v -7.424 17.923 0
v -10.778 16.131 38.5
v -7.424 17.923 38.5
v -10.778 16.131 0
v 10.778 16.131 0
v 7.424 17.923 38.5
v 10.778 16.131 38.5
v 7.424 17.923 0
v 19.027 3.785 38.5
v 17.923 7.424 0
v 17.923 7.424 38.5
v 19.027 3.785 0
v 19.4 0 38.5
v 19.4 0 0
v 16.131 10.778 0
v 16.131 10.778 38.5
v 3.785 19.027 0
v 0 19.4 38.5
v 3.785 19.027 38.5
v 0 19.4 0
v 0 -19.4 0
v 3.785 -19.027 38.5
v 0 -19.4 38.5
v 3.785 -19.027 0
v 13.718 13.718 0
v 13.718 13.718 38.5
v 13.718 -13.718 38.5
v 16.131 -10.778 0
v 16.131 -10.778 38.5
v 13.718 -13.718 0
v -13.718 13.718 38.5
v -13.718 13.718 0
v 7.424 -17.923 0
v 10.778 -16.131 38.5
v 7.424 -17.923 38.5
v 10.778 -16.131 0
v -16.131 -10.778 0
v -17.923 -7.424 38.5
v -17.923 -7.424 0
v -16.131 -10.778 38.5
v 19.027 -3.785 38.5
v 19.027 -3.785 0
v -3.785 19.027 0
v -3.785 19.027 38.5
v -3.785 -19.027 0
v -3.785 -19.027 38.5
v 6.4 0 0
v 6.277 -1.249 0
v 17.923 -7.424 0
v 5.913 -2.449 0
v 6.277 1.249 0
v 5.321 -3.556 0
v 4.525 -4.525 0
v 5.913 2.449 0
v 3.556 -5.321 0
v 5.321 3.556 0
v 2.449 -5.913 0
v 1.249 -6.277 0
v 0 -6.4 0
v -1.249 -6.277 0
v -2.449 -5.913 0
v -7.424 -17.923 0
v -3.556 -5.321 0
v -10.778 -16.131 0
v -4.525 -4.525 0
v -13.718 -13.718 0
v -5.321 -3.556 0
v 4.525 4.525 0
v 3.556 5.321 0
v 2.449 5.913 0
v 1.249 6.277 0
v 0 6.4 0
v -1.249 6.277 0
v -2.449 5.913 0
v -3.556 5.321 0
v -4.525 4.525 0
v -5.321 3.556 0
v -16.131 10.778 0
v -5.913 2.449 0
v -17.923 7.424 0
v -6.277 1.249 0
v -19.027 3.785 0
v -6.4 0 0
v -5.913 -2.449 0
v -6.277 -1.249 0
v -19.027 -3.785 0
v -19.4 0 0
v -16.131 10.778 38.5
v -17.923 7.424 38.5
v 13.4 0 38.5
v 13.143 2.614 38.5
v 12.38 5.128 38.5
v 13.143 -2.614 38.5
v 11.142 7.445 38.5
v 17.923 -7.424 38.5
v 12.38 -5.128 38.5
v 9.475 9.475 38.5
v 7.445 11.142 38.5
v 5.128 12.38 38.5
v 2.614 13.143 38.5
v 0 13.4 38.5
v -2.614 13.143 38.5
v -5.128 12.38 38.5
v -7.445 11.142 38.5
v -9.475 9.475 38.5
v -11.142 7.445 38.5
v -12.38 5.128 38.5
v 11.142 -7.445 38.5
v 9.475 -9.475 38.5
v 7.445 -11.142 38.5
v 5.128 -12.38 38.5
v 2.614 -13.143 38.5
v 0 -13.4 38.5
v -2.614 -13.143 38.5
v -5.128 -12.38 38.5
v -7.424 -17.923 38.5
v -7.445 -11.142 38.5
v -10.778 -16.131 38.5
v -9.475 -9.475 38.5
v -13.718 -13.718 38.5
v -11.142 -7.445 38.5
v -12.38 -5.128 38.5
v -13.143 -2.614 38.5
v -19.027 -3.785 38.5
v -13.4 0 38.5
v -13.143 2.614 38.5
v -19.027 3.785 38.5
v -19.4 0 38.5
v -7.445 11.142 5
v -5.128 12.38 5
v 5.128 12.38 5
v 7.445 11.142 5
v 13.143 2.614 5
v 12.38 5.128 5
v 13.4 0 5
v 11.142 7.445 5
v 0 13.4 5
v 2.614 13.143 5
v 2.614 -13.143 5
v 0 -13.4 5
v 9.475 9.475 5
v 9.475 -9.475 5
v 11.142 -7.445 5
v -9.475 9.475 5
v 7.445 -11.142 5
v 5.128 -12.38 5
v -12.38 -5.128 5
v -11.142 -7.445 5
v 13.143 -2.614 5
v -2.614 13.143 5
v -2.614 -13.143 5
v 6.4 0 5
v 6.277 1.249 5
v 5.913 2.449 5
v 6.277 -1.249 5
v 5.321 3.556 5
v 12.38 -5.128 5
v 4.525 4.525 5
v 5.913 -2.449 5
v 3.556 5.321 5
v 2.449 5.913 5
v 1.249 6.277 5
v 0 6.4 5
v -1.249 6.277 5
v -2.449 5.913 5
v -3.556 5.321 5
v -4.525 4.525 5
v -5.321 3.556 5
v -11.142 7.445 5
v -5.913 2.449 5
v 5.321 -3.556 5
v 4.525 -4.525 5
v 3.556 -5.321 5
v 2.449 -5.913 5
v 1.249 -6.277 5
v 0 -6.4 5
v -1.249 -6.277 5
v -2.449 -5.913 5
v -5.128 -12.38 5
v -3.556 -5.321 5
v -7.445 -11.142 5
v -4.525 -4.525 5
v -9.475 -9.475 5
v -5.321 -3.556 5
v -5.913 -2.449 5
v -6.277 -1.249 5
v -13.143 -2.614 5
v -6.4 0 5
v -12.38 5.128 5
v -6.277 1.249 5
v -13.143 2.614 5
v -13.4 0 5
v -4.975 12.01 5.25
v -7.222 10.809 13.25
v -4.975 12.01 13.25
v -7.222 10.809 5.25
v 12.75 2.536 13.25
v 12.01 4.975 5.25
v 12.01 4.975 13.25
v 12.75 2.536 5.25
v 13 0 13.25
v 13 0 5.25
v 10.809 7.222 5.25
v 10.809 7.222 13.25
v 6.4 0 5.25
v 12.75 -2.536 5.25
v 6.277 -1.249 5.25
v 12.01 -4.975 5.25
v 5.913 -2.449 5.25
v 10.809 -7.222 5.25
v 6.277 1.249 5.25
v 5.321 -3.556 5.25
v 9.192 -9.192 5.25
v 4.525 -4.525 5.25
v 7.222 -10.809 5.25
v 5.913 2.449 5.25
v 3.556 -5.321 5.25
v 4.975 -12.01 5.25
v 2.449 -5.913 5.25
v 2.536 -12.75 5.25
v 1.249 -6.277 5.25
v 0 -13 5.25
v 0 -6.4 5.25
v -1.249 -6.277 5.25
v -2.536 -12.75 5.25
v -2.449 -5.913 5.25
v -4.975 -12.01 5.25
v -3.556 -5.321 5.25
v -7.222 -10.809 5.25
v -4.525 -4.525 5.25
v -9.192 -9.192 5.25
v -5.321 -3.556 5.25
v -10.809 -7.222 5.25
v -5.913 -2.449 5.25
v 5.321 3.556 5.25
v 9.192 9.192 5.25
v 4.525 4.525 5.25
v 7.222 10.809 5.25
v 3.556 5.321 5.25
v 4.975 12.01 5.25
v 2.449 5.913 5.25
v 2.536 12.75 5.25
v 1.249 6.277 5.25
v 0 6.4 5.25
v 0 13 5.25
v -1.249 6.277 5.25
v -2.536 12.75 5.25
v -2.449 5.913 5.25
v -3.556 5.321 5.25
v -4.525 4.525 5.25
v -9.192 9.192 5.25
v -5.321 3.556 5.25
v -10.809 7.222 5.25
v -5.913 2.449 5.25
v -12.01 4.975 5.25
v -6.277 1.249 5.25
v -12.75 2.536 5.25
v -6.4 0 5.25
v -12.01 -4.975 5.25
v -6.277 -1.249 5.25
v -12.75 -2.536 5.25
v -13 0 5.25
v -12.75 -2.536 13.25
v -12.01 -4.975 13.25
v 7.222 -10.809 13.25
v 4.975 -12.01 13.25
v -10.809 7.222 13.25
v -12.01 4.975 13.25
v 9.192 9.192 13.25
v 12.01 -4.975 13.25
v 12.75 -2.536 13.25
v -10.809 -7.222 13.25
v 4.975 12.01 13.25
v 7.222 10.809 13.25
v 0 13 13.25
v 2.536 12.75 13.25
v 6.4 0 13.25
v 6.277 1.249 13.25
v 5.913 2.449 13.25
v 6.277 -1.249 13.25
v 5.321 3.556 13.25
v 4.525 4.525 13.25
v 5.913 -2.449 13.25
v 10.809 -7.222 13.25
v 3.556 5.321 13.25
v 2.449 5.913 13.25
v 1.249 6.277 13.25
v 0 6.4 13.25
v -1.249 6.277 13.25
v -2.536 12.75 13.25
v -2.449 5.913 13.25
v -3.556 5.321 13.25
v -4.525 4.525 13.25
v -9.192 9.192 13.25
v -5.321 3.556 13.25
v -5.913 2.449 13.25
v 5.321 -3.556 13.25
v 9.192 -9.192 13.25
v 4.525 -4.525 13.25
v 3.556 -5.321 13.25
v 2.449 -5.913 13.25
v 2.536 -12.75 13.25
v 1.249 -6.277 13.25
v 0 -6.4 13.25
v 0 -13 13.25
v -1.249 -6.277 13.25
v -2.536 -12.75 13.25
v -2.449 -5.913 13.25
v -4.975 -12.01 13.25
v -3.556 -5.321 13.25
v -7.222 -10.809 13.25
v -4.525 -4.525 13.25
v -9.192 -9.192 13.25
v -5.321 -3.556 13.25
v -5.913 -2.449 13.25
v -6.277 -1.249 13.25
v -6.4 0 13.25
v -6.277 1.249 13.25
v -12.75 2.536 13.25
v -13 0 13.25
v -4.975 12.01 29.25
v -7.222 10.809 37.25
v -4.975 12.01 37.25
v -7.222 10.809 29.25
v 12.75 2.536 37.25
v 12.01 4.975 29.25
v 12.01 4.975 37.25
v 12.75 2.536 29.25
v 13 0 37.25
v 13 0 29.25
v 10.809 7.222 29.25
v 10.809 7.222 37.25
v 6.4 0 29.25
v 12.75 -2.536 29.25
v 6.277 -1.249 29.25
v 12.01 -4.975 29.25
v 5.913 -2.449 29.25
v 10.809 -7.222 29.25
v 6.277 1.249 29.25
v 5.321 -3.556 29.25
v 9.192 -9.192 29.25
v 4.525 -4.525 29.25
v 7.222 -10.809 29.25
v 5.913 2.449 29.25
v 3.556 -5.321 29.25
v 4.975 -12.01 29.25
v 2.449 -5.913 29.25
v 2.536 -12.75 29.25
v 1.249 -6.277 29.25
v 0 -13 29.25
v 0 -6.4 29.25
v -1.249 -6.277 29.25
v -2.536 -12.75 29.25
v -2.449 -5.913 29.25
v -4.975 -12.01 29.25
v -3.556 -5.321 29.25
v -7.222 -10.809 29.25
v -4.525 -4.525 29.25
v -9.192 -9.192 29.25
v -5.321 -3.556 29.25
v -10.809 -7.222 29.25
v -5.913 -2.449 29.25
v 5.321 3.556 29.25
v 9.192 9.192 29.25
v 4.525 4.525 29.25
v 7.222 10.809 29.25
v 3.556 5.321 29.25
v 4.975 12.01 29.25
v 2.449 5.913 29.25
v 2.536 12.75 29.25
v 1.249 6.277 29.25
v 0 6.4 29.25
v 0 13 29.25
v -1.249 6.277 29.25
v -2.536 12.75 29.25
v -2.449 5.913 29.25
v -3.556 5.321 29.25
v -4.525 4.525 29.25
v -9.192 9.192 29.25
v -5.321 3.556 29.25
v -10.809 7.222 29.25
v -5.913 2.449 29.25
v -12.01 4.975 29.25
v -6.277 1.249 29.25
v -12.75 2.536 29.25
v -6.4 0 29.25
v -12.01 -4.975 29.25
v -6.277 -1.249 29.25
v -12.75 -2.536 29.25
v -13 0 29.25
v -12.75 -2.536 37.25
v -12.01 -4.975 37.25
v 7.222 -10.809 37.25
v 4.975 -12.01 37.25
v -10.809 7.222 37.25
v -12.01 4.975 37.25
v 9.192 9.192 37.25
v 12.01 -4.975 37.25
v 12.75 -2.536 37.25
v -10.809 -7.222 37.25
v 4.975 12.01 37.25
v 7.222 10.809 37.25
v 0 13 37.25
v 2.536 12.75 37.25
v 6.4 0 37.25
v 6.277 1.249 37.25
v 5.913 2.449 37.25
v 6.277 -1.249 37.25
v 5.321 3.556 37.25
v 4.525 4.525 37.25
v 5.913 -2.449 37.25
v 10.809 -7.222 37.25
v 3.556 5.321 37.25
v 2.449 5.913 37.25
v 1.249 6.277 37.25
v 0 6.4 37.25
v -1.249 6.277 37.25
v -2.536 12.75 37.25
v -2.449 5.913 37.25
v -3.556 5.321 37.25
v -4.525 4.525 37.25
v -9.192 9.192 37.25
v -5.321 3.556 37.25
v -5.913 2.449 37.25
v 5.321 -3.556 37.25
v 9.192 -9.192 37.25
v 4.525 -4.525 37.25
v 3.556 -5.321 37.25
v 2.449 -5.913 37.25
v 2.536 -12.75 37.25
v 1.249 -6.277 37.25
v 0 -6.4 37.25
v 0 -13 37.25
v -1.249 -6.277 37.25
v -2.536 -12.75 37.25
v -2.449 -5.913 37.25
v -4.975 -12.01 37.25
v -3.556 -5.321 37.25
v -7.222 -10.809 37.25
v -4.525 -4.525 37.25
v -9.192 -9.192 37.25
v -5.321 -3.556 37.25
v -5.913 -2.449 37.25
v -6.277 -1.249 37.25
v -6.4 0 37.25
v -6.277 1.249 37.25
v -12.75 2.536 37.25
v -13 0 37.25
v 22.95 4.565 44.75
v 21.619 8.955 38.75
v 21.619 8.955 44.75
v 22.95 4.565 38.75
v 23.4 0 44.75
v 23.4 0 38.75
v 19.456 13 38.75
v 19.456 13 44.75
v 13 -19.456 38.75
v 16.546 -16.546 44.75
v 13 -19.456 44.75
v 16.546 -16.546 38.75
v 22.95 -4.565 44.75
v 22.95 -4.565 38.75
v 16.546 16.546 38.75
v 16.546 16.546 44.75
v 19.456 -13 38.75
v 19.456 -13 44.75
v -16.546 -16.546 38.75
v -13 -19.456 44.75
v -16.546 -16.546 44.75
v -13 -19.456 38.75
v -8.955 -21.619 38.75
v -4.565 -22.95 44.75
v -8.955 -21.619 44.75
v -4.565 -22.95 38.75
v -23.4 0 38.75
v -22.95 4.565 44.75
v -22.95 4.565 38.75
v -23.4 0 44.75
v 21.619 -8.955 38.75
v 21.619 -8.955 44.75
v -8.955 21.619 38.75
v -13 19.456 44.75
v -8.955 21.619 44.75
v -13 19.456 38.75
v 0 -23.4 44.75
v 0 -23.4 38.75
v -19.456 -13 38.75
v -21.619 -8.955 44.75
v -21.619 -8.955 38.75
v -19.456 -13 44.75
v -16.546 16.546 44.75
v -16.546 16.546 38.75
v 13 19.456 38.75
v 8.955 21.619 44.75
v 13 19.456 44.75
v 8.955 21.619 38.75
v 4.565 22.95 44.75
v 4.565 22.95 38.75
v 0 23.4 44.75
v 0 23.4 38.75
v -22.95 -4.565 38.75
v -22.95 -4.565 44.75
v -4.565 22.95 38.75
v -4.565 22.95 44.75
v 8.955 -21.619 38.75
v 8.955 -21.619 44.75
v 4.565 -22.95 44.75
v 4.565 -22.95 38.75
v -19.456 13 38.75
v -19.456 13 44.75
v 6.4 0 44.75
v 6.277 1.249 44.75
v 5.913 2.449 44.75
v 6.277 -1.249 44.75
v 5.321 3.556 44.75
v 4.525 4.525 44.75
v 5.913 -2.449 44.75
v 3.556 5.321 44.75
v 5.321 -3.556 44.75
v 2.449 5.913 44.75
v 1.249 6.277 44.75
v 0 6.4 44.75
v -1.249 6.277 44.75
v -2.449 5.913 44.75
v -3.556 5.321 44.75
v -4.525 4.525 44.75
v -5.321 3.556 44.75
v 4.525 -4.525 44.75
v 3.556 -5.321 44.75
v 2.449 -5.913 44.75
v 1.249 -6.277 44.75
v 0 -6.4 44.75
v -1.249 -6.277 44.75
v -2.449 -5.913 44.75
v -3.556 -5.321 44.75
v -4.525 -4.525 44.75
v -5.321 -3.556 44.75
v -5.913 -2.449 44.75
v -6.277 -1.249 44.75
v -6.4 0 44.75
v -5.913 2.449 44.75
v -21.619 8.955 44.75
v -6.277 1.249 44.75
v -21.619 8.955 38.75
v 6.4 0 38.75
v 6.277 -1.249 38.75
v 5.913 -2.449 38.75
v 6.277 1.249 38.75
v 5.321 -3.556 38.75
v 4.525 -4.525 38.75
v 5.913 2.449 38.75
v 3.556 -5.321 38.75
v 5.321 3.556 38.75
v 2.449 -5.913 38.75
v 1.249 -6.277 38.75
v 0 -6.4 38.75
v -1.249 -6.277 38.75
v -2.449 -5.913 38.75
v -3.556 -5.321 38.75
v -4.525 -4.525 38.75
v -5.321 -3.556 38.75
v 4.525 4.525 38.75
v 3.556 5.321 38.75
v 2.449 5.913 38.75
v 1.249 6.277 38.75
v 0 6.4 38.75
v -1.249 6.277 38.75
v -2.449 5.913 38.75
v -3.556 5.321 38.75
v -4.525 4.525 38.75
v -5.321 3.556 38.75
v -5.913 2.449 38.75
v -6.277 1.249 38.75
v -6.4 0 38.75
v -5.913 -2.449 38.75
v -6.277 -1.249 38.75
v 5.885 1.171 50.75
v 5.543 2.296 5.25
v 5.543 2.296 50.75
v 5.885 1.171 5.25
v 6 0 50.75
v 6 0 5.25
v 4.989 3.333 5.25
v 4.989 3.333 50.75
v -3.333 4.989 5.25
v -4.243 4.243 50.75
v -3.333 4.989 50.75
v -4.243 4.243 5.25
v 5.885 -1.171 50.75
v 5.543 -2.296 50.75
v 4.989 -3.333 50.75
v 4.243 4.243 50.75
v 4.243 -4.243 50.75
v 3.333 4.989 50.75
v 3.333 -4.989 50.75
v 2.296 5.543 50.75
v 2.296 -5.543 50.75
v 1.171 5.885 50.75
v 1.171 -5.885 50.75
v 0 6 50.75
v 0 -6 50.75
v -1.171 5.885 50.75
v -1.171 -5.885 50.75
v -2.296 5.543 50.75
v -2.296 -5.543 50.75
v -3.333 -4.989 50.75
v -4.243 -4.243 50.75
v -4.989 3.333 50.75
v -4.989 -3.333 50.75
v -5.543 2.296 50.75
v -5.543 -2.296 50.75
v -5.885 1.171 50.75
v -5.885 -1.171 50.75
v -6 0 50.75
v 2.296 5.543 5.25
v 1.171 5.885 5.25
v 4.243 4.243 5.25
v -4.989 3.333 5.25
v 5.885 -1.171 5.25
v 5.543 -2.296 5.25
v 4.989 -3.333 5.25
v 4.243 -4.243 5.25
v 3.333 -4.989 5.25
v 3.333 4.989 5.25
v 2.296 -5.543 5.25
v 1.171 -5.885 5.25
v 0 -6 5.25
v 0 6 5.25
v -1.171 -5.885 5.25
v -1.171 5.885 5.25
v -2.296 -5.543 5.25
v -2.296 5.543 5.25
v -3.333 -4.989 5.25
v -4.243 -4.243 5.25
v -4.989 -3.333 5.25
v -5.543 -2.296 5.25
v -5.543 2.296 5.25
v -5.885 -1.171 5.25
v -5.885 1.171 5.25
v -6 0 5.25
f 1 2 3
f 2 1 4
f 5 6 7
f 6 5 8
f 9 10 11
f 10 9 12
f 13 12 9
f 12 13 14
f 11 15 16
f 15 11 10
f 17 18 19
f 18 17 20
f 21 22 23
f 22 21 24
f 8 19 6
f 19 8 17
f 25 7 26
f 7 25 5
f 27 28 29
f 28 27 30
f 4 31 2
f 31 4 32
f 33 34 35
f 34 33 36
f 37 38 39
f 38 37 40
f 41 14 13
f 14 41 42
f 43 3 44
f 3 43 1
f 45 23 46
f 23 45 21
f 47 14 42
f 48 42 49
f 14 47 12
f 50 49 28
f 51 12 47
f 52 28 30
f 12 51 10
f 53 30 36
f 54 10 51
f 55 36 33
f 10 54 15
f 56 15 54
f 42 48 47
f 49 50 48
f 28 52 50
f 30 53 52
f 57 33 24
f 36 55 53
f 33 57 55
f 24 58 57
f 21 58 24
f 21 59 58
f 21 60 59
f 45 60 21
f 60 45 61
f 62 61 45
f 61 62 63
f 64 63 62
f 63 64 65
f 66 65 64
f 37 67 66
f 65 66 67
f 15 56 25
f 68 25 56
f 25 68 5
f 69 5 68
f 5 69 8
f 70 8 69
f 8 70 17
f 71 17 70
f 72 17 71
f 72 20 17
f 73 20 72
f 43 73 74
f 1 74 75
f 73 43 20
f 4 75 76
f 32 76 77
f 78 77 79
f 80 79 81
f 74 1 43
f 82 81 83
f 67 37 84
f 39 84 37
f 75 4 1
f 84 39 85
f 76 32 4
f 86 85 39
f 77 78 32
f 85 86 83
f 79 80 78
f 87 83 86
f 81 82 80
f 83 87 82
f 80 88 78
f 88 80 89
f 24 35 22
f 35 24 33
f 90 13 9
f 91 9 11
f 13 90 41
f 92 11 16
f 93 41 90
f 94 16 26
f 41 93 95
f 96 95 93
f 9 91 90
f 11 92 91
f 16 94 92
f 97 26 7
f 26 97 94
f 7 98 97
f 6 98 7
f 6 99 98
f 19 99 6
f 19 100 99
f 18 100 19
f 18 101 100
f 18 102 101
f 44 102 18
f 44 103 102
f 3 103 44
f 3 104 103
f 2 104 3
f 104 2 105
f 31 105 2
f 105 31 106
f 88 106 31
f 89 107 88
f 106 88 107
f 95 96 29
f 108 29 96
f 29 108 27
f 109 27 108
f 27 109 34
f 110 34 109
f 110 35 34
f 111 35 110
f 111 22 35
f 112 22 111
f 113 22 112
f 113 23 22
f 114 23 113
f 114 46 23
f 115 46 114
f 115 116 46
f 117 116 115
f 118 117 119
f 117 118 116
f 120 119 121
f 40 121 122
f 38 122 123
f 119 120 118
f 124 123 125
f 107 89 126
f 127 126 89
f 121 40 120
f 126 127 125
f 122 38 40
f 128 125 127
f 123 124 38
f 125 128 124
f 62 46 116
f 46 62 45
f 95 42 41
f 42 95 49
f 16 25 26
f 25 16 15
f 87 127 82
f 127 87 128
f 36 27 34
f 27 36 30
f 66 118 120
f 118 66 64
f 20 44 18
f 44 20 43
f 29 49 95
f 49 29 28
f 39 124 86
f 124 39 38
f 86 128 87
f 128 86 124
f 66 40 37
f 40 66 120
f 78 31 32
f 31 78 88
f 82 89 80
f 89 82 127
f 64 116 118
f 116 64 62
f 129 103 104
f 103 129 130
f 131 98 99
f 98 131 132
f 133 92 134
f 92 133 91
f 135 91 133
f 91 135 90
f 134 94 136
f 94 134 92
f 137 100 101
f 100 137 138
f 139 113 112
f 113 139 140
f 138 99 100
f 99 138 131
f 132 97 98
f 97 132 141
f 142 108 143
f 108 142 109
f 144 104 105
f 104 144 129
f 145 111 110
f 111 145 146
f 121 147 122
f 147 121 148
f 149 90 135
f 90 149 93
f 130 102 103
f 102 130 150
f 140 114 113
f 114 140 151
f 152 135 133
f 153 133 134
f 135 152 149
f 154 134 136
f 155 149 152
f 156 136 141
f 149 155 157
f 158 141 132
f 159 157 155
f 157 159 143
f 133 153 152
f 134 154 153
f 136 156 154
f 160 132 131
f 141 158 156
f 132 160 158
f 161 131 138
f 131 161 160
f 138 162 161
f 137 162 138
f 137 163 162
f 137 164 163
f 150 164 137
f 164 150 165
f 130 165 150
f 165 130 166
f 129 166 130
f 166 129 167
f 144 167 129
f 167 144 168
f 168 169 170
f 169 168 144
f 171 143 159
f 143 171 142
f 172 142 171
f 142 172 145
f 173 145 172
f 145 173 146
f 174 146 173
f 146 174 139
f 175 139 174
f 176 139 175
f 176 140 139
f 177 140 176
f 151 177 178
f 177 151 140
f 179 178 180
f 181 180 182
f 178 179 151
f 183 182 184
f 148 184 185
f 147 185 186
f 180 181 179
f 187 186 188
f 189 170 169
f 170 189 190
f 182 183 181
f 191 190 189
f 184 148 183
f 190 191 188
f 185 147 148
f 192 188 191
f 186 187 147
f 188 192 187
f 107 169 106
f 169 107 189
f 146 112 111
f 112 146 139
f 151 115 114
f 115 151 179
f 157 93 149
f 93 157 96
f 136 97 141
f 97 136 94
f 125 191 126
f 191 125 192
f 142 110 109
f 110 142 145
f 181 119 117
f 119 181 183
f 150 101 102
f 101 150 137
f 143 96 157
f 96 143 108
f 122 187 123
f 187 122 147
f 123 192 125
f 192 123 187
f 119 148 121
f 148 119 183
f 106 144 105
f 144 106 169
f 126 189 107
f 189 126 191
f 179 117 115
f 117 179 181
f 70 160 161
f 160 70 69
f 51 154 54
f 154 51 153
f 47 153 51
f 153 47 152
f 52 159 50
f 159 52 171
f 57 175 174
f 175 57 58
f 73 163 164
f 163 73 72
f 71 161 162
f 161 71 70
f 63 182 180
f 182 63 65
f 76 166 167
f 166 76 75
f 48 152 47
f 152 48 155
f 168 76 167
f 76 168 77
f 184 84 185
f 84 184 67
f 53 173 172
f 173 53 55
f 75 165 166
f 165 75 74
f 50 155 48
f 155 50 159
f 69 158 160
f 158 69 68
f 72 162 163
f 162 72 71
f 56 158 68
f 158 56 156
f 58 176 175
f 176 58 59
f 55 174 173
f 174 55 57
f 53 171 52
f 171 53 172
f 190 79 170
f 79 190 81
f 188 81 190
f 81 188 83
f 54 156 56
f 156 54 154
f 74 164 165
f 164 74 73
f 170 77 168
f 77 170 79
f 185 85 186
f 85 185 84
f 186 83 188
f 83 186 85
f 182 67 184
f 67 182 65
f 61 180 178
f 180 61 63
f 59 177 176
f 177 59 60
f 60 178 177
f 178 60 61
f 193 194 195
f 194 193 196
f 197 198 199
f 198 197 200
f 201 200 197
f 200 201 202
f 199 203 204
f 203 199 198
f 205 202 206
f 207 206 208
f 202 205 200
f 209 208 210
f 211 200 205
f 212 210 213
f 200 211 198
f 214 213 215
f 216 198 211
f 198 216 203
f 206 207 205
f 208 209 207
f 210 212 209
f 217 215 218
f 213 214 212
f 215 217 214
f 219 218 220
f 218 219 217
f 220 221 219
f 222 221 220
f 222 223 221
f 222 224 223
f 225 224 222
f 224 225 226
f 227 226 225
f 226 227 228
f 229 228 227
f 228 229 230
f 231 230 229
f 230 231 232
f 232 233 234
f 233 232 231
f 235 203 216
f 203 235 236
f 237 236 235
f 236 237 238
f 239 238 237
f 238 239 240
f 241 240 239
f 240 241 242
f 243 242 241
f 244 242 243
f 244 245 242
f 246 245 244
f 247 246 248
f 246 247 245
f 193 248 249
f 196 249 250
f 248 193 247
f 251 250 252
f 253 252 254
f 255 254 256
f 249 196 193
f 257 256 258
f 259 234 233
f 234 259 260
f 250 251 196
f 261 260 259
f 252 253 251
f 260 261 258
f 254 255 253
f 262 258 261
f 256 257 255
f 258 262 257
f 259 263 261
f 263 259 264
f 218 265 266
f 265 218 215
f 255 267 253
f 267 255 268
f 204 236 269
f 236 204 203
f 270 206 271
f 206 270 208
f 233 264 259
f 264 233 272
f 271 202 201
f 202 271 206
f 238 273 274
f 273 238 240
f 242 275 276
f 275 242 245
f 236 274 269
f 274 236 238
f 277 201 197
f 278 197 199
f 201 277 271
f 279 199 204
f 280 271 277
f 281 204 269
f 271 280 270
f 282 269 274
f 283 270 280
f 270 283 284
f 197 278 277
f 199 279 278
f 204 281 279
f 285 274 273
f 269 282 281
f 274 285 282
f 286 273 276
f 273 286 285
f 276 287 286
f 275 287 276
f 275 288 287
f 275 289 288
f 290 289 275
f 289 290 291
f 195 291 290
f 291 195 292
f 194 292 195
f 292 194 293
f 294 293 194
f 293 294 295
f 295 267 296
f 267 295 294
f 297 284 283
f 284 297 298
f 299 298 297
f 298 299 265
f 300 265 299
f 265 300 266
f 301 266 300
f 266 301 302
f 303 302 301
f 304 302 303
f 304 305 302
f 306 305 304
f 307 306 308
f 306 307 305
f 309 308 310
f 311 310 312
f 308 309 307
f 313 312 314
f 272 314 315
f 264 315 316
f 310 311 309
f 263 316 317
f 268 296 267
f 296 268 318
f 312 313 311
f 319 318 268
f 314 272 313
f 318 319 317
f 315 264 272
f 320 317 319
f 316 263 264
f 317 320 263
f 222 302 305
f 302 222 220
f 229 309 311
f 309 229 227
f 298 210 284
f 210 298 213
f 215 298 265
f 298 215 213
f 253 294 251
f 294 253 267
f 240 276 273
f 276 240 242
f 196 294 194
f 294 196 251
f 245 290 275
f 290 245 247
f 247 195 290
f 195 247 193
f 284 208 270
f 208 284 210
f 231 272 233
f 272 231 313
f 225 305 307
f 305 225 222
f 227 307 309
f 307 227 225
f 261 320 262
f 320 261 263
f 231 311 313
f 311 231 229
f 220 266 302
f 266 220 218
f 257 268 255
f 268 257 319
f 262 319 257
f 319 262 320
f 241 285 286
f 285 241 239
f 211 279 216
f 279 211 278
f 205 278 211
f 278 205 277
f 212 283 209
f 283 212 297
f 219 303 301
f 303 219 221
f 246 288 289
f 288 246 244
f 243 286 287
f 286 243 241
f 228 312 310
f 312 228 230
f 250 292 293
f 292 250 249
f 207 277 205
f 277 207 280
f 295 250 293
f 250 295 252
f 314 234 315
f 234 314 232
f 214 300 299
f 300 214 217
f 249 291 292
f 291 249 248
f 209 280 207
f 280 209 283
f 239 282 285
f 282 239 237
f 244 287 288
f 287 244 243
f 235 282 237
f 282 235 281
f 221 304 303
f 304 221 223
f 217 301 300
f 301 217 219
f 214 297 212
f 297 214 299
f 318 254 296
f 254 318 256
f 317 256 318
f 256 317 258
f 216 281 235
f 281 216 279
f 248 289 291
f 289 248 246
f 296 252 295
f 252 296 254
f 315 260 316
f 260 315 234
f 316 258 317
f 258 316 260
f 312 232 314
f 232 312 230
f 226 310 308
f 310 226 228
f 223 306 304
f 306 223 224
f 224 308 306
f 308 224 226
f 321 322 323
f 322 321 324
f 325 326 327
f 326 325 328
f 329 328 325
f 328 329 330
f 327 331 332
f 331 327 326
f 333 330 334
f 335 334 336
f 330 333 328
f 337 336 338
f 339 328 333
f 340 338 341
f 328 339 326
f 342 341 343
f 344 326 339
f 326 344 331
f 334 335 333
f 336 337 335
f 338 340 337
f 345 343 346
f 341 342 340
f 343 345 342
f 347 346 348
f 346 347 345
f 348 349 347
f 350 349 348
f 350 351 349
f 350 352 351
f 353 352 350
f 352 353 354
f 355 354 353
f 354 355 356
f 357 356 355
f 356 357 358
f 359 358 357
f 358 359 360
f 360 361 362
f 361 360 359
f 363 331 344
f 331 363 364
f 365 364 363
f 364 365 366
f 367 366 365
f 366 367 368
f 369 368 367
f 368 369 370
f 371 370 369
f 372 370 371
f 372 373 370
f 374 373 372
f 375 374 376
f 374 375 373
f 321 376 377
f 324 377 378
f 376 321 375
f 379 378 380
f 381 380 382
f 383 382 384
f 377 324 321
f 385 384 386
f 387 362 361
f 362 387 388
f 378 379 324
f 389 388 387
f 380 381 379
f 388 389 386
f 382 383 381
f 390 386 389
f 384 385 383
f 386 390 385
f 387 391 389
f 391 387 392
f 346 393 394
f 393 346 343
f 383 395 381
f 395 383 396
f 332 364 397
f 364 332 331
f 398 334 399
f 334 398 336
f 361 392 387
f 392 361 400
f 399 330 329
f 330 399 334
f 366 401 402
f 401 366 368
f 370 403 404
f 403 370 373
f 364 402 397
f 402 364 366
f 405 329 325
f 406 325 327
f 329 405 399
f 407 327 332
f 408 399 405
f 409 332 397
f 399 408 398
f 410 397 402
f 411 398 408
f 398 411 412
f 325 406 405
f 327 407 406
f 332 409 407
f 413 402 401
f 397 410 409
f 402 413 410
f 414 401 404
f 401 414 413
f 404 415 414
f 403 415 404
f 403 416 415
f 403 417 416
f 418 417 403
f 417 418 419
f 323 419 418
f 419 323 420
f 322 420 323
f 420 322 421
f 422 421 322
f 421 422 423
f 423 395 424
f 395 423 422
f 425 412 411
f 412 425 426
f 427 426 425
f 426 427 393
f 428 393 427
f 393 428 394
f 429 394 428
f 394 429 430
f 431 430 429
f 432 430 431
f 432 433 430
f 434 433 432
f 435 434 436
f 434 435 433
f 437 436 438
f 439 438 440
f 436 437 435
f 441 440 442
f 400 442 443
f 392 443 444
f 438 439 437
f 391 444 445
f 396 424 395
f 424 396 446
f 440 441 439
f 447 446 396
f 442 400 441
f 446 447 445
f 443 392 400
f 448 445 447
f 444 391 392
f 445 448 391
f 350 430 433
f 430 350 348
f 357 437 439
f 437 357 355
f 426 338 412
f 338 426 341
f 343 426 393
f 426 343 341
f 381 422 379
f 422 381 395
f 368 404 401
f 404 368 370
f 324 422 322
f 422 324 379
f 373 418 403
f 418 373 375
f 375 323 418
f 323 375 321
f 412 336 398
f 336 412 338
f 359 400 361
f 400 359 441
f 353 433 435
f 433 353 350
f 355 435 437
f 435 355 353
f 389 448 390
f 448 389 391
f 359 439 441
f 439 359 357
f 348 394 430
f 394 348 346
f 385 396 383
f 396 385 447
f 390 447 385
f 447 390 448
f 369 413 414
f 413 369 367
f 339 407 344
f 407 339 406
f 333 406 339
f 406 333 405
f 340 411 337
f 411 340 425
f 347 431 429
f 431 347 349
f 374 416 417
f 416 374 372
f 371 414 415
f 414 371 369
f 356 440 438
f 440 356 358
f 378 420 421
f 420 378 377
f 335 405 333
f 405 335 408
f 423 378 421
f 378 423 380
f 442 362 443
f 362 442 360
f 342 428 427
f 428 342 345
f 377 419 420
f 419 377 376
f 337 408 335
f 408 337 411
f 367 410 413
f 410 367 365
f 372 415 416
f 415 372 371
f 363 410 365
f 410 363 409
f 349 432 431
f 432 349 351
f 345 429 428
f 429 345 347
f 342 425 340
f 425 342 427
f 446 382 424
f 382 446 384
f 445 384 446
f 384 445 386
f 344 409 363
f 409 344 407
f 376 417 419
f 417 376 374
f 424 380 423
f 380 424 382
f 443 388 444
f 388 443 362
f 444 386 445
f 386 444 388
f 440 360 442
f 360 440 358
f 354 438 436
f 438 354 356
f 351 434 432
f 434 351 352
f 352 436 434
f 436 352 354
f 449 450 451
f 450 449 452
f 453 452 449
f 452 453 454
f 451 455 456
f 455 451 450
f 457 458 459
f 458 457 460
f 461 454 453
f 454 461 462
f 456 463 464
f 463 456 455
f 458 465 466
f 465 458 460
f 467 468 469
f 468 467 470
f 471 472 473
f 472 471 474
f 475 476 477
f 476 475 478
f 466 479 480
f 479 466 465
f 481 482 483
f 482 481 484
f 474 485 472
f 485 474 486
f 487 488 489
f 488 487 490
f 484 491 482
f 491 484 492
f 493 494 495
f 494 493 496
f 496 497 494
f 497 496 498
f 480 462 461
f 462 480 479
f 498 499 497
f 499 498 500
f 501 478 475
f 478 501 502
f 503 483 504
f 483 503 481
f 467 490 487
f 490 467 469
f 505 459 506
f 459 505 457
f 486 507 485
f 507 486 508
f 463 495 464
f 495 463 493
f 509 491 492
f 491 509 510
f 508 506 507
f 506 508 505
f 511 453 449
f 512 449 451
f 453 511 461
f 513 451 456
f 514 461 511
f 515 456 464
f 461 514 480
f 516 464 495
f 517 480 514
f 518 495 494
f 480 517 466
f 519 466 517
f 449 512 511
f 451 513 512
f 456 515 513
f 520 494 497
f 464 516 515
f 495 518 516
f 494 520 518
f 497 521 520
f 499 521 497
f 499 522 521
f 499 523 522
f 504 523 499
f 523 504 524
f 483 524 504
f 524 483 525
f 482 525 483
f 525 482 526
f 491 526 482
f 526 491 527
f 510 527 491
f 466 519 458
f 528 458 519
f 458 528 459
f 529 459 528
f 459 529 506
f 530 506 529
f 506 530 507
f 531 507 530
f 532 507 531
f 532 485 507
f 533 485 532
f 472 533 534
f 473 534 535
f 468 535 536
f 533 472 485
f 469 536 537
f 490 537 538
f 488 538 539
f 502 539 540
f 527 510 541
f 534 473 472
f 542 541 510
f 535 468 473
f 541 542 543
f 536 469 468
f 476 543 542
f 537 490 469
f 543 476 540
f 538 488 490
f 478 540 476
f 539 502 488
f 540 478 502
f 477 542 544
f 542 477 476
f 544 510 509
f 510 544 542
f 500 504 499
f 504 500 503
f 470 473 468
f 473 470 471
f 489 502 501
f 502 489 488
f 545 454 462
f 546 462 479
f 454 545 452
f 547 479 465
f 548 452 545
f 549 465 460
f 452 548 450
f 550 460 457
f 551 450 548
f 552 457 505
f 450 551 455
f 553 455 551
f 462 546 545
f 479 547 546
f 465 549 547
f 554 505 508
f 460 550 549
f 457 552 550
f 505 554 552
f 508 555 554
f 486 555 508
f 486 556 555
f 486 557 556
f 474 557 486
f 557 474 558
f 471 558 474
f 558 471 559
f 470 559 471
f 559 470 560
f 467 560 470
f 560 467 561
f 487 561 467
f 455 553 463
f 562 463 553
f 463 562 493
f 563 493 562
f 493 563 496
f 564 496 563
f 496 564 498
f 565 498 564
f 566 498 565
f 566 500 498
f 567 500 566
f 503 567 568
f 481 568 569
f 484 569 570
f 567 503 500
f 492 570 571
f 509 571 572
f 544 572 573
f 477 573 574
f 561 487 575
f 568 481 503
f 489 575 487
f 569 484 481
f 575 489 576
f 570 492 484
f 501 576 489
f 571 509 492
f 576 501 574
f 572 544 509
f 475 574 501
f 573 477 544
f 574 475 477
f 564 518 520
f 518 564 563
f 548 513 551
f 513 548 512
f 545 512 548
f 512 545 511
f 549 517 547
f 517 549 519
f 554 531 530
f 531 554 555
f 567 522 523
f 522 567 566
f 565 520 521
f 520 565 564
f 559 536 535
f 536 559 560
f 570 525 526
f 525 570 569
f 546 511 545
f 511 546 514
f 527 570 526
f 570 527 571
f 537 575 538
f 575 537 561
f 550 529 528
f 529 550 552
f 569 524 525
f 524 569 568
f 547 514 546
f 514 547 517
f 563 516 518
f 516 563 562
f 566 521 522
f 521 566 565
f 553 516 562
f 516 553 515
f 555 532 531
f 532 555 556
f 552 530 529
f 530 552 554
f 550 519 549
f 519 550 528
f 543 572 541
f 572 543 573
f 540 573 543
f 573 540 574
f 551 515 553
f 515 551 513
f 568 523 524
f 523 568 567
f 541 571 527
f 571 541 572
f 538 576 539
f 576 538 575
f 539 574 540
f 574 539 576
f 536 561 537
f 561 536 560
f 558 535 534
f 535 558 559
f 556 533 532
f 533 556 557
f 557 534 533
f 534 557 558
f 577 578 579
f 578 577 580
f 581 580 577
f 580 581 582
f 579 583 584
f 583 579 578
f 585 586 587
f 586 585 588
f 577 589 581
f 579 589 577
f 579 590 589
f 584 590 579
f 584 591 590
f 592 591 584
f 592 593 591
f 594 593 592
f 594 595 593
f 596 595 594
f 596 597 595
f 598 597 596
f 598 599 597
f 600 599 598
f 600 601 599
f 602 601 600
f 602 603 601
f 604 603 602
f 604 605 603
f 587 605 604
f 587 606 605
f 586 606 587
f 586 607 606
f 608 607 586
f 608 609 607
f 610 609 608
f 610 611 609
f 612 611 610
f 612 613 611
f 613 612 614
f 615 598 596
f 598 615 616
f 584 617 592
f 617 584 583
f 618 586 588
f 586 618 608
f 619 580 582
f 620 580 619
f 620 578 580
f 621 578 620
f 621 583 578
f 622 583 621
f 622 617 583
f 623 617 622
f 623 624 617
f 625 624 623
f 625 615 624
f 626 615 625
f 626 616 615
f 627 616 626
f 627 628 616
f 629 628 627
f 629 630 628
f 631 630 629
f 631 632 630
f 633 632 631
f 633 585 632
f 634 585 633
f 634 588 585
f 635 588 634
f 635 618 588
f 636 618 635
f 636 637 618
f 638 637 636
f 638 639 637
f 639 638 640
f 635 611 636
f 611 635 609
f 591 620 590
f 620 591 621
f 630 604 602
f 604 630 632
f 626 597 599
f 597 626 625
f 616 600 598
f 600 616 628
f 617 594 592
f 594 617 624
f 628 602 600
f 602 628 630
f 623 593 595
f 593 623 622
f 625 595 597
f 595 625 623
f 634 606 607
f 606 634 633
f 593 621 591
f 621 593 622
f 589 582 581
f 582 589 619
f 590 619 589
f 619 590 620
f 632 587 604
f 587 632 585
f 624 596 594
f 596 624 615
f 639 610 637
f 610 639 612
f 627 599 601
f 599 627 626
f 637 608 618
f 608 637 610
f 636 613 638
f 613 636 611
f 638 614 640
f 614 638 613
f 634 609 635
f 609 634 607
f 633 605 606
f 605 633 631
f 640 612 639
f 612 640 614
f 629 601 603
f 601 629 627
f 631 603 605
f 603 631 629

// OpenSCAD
$fn = 32;

// ------------------------------------------------------------------------
// Shaft station: cup d38.8 x 38.5 mm, shaft d12
// Every part is its own module, assembly() places every instance.
// ------------------------------------------------------------------------

// --- part 1 ---
module housing_cup() {
  difference() {
    cylinder(h = 38.5, d = 38.8);
    translate([0, 0, 5]) cylinder(h = 34.5, d = 26.8);
    translate([0, 0, -1]) cylinder(h = 7, d = 12.8);
  }
}

// --- part 2 ---
module bearing_lower() {
  difference() {
      translate([0, 0, 0]) cylinder(h = 8, d = 26);
      translate([0, 0, -1]) cylinder(h = 10, d = 12.8);
    }
}

// --- part 3 ---
module bearing_upper() {
  difference() {
      translate([0, 0, 0]) cylinder(h = 8, d = 26);
      translate([0, 0, -1]) cylinder(h = 10, d = 12.8);
    }
}

// --- part 4 ---
module station_shaft() {
  translate([0, 0, -22.75]) cylinder(h = 45.5, d = 12);
}

// --- part 5 ---
module station_cover() {
  difference() {
    cylinder(h = 6, d = 46.8);
    translate([0, 0, -1]) cylinder(h = 8, d = 12.8);
  }
}

// --- assembly ---
module assembly() {
  color([0.80, 0.24, 0.20]) translate([0, 0, 0]) rotate([0, 0, 0]) housing_cup();
  color([0.20, 0.45, 0.75]) translate([0, 0, 5.25]) rotate([0, 0, 0]) bearing_lower();
  color([0.25, 0.62, 0.32]) translate([0, 0, 29.25]) rotate([0, 0, 0]) bearing_upper();
  color([0.92, 0.70, 0.18]) translate([0, 0, 28]) rotate([0, 0, 0]) station_shaft();
  color([0.58, 0.35, 0.70]) translate([0, 0, 38.75]) rotate([0, 0, 0]) station_cover();
}

assembly();
